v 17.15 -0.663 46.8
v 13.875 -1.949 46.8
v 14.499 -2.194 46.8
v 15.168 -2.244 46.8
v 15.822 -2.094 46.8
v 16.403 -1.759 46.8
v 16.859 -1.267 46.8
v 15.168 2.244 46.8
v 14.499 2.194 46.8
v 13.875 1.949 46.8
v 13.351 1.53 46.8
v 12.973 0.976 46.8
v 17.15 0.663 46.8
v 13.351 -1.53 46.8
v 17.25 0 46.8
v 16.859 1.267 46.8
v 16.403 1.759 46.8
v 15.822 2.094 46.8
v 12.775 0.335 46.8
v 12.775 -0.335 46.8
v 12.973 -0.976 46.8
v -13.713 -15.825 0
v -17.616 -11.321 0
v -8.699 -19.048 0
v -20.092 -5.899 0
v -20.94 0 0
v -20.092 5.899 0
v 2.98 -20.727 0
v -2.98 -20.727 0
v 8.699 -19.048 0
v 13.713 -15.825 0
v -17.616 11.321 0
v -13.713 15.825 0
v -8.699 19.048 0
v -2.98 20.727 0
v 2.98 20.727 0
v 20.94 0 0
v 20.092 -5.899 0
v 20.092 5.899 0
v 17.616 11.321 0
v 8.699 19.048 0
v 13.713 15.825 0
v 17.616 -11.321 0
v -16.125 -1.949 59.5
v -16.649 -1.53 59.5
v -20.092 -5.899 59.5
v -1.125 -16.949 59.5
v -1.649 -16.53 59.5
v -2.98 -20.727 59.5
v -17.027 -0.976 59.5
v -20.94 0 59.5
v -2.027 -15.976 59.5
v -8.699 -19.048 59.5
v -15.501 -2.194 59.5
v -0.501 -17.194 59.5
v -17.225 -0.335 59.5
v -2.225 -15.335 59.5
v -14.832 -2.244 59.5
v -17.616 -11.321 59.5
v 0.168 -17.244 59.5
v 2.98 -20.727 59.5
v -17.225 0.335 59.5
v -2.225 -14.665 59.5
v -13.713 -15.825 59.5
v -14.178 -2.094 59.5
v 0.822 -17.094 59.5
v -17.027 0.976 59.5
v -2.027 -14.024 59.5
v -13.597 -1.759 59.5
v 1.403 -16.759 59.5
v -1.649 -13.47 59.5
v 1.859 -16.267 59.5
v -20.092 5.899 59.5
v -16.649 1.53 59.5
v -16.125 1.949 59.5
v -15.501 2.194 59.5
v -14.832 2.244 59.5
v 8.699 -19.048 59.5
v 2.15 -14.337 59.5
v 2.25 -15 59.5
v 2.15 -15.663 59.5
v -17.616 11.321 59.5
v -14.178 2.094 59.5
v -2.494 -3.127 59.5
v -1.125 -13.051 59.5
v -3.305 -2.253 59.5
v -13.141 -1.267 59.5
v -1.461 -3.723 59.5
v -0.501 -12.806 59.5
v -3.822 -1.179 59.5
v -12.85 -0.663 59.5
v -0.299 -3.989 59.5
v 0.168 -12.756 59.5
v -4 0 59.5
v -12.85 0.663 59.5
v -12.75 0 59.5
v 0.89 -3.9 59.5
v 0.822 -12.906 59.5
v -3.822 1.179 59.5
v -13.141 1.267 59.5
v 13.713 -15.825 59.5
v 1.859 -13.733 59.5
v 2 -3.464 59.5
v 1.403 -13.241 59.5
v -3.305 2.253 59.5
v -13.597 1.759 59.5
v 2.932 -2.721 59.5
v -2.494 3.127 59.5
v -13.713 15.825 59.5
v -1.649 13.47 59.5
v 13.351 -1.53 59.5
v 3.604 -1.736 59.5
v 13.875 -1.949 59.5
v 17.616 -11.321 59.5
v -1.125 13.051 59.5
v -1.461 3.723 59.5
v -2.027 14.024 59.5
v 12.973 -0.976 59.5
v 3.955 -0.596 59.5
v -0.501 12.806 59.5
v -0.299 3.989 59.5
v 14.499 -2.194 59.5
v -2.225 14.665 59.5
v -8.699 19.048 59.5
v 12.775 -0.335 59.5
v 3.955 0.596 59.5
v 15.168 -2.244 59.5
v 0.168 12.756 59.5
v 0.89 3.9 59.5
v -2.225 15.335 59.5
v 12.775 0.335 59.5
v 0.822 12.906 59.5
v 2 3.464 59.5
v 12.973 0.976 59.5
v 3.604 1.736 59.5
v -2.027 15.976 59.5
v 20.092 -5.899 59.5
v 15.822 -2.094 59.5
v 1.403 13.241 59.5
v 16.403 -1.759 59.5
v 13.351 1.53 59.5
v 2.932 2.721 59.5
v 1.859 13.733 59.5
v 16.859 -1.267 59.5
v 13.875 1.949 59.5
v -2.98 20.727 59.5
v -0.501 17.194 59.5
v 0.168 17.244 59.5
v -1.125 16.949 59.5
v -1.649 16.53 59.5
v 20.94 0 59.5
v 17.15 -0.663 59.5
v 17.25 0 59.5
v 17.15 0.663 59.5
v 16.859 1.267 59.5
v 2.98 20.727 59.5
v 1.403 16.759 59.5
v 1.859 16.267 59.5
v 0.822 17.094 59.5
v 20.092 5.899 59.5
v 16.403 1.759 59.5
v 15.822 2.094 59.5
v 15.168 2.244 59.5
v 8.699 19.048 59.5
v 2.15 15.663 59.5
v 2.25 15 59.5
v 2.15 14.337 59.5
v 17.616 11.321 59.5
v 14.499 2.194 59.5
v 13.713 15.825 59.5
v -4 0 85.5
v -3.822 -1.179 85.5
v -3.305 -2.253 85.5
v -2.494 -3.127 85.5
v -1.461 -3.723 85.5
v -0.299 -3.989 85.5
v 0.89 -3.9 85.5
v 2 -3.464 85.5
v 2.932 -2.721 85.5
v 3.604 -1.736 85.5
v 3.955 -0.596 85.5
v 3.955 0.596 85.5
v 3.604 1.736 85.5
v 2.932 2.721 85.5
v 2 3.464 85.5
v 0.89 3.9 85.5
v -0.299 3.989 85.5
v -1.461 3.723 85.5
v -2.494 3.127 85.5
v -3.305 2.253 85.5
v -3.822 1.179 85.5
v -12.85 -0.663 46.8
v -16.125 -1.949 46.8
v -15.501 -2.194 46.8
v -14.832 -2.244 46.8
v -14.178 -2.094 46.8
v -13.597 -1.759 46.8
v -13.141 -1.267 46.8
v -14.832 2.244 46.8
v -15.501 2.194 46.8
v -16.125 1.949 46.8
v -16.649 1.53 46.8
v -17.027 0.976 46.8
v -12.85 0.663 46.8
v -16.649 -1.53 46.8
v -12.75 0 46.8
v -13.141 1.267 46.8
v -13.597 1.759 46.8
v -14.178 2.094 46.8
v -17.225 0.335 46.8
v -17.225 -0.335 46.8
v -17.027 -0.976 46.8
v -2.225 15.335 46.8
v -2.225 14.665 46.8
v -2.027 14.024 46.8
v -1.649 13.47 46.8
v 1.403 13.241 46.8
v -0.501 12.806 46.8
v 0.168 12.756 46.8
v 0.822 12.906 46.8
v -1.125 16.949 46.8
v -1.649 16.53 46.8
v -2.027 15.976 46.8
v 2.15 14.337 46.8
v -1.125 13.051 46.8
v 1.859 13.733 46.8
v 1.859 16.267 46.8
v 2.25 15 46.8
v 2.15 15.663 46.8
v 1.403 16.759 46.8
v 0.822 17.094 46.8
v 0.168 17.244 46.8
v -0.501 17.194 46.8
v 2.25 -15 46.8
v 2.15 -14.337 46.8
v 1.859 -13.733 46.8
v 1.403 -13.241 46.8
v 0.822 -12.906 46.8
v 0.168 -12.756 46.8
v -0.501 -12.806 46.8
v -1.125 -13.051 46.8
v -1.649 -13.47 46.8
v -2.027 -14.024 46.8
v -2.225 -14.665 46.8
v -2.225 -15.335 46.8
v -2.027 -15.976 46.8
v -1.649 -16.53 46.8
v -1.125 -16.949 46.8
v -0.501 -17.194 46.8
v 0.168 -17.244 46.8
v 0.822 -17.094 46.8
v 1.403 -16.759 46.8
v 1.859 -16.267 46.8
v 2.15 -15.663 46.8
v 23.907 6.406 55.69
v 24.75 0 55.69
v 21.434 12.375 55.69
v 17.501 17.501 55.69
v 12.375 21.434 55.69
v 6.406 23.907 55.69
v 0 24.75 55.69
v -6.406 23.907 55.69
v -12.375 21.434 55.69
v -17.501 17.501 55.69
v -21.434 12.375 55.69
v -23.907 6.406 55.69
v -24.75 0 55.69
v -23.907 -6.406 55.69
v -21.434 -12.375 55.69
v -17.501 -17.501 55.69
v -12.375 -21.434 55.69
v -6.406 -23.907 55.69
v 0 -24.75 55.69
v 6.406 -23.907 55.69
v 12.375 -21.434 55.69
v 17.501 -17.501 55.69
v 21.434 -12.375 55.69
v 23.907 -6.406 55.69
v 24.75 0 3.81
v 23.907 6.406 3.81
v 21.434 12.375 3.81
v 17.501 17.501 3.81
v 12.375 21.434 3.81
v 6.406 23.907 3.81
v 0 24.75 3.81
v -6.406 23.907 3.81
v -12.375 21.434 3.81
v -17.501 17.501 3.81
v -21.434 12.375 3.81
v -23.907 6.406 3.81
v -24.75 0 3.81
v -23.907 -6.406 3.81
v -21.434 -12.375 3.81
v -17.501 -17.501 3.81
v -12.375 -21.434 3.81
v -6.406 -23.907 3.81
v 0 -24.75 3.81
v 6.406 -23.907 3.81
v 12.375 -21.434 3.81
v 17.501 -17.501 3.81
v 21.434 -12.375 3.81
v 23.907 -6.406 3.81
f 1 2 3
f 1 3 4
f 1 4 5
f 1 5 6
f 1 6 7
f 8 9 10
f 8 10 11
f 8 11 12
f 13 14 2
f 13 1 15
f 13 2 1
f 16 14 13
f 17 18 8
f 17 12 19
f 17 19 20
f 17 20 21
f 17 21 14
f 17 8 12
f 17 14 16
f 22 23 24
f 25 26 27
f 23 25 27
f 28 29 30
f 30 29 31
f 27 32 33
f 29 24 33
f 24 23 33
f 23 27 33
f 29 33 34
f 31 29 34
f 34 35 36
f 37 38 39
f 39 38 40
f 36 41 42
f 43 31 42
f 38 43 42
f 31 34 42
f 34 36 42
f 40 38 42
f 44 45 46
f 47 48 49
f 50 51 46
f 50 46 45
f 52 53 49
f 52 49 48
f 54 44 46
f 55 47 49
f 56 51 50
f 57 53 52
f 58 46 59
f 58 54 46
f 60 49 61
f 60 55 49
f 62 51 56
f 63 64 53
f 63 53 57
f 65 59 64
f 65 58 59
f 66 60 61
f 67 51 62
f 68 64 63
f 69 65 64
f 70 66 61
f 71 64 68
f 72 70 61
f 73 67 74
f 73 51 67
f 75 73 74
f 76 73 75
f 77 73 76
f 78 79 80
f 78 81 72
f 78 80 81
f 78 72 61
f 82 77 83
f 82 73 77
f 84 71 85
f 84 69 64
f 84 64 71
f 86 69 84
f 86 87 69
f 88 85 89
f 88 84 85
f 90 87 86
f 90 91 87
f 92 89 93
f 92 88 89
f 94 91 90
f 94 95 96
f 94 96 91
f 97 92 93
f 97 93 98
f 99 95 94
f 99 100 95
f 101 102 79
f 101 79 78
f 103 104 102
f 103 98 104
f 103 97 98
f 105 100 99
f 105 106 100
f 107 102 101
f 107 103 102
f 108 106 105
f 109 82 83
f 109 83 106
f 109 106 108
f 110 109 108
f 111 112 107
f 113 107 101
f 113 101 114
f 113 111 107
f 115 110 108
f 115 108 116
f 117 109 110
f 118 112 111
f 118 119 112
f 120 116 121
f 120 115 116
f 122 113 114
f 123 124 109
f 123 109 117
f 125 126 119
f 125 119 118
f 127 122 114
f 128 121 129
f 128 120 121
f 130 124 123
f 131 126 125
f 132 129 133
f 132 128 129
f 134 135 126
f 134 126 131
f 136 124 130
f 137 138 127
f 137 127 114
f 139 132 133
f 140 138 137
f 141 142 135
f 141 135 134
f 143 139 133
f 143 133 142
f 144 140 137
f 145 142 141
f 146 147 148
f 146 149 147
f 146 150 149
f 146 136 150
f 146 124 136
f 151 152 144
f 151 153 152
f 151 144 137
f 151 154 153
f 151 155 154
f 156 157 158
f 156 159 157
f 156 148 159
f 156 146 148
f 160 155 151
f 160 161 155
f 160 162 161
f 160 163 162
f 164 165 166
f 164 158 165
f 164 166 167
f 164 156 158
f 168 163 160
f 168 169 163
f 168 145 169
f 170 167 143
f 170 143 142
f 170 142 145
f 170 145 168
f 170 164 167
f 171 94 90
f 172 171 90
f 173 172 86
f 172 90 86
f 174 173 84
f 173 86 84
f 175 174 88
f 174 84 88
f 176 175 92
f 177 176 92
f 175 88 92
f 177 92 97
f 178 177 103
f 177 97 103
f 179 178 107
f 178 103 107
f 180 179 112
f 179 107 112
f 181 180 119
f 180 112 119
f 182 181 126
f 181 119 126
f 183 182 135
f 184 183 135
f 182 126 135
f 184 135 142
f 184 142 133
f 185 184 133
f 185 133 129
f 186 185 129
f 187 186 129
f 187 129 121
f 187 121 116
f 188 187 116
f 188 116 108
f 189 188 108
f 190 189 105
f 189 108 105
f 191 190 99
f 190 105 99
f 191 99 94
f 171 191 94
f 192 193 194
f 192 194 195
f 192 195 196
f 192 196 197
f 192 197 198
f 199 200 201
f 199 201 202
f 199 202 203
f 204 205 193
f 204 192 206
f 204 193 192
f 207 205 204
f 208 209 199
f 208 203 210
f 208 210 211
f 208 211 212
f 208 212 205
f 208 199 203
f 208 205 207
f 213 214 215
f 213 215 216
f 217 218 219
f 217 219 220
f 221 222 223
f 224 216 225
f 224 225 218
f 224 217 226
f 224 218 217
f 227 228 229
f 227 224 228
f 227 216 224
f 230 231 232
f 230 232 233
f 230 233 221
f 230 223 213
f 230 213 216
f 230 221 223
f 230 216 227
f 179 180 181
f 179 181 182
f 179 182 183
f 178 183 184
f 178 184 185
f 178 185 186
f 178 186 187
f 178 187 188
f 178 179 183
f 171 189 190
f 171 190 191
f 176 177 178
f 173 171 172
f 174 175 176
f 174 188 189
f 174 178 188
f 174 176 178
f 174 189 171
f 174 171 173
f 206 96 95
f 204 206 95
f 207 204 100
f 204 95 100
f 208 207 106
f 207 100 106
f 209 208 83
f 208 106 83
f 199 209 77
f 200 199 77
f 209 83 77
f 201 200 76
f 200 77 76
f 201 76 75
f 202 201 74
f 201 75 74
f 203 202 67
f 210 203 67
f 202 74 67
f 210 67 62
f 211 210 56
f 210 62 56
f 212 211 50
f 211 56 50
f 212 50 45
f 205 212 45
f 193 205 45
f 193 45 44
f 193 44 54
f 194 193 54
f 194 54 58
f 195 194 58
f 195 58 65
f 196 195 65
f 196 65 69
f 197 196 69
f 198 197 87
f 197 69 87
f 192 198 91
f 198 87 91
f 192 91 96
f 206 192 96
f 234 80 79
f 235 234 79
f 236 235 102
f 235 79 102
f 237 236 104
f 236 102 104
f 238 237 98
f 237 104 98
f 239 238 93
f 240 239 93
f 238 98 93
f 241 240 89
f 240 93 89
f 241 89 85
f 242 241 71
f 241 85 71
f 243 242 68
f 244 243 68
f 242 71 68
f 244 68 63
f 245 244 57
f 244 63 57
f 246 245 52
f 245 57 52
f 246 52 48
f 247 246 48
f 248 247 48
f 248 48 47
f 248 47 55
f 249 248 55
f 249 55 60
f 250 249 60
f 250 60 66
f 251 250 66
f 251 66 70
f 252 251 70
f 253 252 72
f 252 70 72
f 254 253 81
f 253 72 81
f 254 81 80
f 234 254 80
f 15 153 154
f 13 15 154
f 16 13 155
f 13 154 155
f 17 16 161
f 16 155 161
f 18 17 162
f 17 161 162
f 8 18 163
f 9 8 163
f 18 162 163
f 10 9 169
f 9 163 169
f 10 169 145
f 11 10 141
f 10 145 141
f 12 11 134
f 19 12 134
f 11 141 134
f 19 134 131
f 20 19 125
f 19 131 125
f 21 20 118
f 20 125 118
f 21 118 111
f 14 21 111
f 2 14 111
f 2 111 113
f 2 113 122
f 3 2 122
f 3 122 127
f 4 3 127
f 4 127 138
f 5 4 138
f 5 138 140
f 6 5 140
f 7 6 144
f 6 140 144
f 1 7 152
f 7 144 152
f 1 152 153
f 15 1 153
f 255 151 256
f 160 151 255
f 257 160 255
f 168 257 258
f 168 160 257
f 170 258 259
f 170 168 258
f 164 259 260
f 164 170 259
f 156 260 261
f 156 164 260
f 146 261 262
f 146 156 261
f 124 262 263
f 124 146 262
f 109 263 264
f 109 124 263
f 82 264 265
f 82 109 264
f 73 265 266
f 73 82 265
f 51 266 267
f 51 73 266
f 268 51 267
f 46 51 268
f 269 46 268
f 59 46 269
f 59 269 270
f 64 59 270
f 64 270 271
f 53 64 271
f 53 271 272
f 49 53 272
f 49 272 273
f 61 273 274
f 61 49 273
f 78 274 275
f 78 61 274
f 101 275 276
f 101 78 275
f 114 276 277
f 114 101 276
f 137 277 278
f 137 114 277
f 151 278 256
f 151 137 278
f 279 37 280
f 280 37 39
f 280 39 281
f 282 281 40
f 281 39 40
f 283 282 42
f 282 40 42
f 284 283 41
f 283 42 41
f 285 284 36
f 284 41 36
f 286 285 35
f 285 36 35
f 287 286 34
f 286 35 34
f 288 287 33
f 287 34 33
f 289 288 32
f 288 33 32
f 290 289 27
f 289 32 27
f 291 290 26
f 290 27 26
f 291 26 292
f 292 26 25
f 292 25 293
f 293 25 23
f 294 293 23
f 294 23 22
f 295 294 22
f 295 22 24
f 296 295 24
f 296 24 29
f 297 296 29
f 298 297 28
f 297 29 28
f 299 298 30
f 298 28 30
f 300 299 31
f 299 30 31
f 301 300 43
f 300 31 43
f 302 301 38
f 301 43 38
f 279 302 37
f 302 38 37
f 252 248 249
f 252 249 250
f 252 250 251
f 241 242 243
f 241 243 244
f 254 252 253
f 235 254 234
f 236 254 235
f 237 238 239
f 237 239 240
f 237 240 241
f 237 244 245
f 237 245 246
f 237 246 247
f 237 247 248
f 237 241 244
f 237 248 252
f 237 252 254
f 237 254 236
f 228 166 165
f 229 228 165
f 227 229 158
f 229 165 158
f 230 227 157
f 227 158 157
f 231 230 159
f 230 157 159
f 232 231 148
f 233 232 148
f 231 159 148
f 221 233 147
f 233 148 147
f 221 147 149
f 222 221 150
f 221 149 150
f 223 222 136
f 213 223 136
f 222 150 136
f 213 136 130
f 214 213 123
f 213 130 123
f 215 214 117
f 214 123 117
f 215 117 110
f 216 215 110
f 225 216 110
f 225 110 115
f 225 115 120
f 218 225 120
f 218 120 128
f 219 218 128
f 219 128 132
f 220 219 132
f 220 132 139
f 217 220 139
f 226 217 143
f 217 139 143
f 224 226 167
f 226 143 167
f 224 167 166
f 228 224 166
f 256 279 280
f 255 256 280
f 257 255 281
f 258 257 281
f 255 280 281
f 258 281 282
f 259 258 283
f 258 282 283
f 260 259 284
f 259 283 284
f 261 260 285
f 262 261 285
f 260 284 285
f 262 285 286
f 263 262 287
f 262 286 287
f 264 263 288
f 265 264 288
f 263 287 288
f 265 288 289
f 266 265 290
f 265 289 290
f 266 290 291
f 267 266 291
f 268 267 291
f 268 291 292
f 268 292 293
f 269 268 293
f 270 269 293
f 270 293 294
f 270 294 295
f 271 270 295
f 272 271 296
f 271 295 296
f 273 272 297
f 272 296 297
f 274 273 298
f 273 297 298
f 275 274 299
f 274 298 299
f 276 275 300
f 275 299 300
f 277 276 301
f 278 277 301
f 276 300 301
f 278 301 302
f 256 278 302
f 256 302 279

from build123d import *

# Parameters (mm, degrees)
SKETCH1_R           = 24.75
BOSS_EXTRUDE1_DEPTH = 59.5
SKETCH2_R           = 4
BOSS_EXTRUDE2_DEPTH = 26
CHAMFER1_SIZE       = 3.81
CHAMFER2_SIZE       = 3.81
SKETCH3_R           = 2.25
CUT_EXTRUDE3_DEPTH  = 12.7


with BuildPart() as part:
    # Sketch1 → Boss-Extrude1 (new body)
    with BuildSketch(Plane.XY):
        Circle(SKETCH1_R)
    extrude(amount=BOSS_EXTRUDE1_DEPTH)

    # Sketch2 → Boss-Extrude2 (add)
    with BuildSketch(Plane.XY.offset(59.5)):
        with Locations(Location((0, 0, 0), (0, 0, 180))):
            Circle(SKETCH2_R)
    extrude(amount=BOSS_EXTRUDE2_DEPTH)

    # Chamfer1
    chamfer1_edges = [part.edges().sort_by_distance(p)[0] for p in [
        (-24.75, 0, 59.5),
    ]]
    chamfer(chamfer1_edges, length=CHAMFER1_SIZE)

    # Chamfer2
    chamfer2_edges = [part.edges().sort_by_distance(p)[0] for p in [
        (-24.75, 0, 0),
    ]]
    chamfer(chamfer2_edges, length=CHAMFER2_SIZE)

    # Sketch3 → Cut-Extrude3 (cut)
    with BuildSketch(Plane.XY.offset(59.5)):
        with Locations((0, 15)):
            Circle(SKETCH3_R)
        with Locations((15, 0)):
            Circle(SKETCH3_R)
        with Locations((0, -15)):
            Circle(SKETCH3_R)
        with Locations((-15, 0)):
            Circle(SKETCH3_R)
    extrude(amount=-CUT_EXTRUDE3_DEPTH, mode=Mode.SUBTRACT)


solid = part.part
